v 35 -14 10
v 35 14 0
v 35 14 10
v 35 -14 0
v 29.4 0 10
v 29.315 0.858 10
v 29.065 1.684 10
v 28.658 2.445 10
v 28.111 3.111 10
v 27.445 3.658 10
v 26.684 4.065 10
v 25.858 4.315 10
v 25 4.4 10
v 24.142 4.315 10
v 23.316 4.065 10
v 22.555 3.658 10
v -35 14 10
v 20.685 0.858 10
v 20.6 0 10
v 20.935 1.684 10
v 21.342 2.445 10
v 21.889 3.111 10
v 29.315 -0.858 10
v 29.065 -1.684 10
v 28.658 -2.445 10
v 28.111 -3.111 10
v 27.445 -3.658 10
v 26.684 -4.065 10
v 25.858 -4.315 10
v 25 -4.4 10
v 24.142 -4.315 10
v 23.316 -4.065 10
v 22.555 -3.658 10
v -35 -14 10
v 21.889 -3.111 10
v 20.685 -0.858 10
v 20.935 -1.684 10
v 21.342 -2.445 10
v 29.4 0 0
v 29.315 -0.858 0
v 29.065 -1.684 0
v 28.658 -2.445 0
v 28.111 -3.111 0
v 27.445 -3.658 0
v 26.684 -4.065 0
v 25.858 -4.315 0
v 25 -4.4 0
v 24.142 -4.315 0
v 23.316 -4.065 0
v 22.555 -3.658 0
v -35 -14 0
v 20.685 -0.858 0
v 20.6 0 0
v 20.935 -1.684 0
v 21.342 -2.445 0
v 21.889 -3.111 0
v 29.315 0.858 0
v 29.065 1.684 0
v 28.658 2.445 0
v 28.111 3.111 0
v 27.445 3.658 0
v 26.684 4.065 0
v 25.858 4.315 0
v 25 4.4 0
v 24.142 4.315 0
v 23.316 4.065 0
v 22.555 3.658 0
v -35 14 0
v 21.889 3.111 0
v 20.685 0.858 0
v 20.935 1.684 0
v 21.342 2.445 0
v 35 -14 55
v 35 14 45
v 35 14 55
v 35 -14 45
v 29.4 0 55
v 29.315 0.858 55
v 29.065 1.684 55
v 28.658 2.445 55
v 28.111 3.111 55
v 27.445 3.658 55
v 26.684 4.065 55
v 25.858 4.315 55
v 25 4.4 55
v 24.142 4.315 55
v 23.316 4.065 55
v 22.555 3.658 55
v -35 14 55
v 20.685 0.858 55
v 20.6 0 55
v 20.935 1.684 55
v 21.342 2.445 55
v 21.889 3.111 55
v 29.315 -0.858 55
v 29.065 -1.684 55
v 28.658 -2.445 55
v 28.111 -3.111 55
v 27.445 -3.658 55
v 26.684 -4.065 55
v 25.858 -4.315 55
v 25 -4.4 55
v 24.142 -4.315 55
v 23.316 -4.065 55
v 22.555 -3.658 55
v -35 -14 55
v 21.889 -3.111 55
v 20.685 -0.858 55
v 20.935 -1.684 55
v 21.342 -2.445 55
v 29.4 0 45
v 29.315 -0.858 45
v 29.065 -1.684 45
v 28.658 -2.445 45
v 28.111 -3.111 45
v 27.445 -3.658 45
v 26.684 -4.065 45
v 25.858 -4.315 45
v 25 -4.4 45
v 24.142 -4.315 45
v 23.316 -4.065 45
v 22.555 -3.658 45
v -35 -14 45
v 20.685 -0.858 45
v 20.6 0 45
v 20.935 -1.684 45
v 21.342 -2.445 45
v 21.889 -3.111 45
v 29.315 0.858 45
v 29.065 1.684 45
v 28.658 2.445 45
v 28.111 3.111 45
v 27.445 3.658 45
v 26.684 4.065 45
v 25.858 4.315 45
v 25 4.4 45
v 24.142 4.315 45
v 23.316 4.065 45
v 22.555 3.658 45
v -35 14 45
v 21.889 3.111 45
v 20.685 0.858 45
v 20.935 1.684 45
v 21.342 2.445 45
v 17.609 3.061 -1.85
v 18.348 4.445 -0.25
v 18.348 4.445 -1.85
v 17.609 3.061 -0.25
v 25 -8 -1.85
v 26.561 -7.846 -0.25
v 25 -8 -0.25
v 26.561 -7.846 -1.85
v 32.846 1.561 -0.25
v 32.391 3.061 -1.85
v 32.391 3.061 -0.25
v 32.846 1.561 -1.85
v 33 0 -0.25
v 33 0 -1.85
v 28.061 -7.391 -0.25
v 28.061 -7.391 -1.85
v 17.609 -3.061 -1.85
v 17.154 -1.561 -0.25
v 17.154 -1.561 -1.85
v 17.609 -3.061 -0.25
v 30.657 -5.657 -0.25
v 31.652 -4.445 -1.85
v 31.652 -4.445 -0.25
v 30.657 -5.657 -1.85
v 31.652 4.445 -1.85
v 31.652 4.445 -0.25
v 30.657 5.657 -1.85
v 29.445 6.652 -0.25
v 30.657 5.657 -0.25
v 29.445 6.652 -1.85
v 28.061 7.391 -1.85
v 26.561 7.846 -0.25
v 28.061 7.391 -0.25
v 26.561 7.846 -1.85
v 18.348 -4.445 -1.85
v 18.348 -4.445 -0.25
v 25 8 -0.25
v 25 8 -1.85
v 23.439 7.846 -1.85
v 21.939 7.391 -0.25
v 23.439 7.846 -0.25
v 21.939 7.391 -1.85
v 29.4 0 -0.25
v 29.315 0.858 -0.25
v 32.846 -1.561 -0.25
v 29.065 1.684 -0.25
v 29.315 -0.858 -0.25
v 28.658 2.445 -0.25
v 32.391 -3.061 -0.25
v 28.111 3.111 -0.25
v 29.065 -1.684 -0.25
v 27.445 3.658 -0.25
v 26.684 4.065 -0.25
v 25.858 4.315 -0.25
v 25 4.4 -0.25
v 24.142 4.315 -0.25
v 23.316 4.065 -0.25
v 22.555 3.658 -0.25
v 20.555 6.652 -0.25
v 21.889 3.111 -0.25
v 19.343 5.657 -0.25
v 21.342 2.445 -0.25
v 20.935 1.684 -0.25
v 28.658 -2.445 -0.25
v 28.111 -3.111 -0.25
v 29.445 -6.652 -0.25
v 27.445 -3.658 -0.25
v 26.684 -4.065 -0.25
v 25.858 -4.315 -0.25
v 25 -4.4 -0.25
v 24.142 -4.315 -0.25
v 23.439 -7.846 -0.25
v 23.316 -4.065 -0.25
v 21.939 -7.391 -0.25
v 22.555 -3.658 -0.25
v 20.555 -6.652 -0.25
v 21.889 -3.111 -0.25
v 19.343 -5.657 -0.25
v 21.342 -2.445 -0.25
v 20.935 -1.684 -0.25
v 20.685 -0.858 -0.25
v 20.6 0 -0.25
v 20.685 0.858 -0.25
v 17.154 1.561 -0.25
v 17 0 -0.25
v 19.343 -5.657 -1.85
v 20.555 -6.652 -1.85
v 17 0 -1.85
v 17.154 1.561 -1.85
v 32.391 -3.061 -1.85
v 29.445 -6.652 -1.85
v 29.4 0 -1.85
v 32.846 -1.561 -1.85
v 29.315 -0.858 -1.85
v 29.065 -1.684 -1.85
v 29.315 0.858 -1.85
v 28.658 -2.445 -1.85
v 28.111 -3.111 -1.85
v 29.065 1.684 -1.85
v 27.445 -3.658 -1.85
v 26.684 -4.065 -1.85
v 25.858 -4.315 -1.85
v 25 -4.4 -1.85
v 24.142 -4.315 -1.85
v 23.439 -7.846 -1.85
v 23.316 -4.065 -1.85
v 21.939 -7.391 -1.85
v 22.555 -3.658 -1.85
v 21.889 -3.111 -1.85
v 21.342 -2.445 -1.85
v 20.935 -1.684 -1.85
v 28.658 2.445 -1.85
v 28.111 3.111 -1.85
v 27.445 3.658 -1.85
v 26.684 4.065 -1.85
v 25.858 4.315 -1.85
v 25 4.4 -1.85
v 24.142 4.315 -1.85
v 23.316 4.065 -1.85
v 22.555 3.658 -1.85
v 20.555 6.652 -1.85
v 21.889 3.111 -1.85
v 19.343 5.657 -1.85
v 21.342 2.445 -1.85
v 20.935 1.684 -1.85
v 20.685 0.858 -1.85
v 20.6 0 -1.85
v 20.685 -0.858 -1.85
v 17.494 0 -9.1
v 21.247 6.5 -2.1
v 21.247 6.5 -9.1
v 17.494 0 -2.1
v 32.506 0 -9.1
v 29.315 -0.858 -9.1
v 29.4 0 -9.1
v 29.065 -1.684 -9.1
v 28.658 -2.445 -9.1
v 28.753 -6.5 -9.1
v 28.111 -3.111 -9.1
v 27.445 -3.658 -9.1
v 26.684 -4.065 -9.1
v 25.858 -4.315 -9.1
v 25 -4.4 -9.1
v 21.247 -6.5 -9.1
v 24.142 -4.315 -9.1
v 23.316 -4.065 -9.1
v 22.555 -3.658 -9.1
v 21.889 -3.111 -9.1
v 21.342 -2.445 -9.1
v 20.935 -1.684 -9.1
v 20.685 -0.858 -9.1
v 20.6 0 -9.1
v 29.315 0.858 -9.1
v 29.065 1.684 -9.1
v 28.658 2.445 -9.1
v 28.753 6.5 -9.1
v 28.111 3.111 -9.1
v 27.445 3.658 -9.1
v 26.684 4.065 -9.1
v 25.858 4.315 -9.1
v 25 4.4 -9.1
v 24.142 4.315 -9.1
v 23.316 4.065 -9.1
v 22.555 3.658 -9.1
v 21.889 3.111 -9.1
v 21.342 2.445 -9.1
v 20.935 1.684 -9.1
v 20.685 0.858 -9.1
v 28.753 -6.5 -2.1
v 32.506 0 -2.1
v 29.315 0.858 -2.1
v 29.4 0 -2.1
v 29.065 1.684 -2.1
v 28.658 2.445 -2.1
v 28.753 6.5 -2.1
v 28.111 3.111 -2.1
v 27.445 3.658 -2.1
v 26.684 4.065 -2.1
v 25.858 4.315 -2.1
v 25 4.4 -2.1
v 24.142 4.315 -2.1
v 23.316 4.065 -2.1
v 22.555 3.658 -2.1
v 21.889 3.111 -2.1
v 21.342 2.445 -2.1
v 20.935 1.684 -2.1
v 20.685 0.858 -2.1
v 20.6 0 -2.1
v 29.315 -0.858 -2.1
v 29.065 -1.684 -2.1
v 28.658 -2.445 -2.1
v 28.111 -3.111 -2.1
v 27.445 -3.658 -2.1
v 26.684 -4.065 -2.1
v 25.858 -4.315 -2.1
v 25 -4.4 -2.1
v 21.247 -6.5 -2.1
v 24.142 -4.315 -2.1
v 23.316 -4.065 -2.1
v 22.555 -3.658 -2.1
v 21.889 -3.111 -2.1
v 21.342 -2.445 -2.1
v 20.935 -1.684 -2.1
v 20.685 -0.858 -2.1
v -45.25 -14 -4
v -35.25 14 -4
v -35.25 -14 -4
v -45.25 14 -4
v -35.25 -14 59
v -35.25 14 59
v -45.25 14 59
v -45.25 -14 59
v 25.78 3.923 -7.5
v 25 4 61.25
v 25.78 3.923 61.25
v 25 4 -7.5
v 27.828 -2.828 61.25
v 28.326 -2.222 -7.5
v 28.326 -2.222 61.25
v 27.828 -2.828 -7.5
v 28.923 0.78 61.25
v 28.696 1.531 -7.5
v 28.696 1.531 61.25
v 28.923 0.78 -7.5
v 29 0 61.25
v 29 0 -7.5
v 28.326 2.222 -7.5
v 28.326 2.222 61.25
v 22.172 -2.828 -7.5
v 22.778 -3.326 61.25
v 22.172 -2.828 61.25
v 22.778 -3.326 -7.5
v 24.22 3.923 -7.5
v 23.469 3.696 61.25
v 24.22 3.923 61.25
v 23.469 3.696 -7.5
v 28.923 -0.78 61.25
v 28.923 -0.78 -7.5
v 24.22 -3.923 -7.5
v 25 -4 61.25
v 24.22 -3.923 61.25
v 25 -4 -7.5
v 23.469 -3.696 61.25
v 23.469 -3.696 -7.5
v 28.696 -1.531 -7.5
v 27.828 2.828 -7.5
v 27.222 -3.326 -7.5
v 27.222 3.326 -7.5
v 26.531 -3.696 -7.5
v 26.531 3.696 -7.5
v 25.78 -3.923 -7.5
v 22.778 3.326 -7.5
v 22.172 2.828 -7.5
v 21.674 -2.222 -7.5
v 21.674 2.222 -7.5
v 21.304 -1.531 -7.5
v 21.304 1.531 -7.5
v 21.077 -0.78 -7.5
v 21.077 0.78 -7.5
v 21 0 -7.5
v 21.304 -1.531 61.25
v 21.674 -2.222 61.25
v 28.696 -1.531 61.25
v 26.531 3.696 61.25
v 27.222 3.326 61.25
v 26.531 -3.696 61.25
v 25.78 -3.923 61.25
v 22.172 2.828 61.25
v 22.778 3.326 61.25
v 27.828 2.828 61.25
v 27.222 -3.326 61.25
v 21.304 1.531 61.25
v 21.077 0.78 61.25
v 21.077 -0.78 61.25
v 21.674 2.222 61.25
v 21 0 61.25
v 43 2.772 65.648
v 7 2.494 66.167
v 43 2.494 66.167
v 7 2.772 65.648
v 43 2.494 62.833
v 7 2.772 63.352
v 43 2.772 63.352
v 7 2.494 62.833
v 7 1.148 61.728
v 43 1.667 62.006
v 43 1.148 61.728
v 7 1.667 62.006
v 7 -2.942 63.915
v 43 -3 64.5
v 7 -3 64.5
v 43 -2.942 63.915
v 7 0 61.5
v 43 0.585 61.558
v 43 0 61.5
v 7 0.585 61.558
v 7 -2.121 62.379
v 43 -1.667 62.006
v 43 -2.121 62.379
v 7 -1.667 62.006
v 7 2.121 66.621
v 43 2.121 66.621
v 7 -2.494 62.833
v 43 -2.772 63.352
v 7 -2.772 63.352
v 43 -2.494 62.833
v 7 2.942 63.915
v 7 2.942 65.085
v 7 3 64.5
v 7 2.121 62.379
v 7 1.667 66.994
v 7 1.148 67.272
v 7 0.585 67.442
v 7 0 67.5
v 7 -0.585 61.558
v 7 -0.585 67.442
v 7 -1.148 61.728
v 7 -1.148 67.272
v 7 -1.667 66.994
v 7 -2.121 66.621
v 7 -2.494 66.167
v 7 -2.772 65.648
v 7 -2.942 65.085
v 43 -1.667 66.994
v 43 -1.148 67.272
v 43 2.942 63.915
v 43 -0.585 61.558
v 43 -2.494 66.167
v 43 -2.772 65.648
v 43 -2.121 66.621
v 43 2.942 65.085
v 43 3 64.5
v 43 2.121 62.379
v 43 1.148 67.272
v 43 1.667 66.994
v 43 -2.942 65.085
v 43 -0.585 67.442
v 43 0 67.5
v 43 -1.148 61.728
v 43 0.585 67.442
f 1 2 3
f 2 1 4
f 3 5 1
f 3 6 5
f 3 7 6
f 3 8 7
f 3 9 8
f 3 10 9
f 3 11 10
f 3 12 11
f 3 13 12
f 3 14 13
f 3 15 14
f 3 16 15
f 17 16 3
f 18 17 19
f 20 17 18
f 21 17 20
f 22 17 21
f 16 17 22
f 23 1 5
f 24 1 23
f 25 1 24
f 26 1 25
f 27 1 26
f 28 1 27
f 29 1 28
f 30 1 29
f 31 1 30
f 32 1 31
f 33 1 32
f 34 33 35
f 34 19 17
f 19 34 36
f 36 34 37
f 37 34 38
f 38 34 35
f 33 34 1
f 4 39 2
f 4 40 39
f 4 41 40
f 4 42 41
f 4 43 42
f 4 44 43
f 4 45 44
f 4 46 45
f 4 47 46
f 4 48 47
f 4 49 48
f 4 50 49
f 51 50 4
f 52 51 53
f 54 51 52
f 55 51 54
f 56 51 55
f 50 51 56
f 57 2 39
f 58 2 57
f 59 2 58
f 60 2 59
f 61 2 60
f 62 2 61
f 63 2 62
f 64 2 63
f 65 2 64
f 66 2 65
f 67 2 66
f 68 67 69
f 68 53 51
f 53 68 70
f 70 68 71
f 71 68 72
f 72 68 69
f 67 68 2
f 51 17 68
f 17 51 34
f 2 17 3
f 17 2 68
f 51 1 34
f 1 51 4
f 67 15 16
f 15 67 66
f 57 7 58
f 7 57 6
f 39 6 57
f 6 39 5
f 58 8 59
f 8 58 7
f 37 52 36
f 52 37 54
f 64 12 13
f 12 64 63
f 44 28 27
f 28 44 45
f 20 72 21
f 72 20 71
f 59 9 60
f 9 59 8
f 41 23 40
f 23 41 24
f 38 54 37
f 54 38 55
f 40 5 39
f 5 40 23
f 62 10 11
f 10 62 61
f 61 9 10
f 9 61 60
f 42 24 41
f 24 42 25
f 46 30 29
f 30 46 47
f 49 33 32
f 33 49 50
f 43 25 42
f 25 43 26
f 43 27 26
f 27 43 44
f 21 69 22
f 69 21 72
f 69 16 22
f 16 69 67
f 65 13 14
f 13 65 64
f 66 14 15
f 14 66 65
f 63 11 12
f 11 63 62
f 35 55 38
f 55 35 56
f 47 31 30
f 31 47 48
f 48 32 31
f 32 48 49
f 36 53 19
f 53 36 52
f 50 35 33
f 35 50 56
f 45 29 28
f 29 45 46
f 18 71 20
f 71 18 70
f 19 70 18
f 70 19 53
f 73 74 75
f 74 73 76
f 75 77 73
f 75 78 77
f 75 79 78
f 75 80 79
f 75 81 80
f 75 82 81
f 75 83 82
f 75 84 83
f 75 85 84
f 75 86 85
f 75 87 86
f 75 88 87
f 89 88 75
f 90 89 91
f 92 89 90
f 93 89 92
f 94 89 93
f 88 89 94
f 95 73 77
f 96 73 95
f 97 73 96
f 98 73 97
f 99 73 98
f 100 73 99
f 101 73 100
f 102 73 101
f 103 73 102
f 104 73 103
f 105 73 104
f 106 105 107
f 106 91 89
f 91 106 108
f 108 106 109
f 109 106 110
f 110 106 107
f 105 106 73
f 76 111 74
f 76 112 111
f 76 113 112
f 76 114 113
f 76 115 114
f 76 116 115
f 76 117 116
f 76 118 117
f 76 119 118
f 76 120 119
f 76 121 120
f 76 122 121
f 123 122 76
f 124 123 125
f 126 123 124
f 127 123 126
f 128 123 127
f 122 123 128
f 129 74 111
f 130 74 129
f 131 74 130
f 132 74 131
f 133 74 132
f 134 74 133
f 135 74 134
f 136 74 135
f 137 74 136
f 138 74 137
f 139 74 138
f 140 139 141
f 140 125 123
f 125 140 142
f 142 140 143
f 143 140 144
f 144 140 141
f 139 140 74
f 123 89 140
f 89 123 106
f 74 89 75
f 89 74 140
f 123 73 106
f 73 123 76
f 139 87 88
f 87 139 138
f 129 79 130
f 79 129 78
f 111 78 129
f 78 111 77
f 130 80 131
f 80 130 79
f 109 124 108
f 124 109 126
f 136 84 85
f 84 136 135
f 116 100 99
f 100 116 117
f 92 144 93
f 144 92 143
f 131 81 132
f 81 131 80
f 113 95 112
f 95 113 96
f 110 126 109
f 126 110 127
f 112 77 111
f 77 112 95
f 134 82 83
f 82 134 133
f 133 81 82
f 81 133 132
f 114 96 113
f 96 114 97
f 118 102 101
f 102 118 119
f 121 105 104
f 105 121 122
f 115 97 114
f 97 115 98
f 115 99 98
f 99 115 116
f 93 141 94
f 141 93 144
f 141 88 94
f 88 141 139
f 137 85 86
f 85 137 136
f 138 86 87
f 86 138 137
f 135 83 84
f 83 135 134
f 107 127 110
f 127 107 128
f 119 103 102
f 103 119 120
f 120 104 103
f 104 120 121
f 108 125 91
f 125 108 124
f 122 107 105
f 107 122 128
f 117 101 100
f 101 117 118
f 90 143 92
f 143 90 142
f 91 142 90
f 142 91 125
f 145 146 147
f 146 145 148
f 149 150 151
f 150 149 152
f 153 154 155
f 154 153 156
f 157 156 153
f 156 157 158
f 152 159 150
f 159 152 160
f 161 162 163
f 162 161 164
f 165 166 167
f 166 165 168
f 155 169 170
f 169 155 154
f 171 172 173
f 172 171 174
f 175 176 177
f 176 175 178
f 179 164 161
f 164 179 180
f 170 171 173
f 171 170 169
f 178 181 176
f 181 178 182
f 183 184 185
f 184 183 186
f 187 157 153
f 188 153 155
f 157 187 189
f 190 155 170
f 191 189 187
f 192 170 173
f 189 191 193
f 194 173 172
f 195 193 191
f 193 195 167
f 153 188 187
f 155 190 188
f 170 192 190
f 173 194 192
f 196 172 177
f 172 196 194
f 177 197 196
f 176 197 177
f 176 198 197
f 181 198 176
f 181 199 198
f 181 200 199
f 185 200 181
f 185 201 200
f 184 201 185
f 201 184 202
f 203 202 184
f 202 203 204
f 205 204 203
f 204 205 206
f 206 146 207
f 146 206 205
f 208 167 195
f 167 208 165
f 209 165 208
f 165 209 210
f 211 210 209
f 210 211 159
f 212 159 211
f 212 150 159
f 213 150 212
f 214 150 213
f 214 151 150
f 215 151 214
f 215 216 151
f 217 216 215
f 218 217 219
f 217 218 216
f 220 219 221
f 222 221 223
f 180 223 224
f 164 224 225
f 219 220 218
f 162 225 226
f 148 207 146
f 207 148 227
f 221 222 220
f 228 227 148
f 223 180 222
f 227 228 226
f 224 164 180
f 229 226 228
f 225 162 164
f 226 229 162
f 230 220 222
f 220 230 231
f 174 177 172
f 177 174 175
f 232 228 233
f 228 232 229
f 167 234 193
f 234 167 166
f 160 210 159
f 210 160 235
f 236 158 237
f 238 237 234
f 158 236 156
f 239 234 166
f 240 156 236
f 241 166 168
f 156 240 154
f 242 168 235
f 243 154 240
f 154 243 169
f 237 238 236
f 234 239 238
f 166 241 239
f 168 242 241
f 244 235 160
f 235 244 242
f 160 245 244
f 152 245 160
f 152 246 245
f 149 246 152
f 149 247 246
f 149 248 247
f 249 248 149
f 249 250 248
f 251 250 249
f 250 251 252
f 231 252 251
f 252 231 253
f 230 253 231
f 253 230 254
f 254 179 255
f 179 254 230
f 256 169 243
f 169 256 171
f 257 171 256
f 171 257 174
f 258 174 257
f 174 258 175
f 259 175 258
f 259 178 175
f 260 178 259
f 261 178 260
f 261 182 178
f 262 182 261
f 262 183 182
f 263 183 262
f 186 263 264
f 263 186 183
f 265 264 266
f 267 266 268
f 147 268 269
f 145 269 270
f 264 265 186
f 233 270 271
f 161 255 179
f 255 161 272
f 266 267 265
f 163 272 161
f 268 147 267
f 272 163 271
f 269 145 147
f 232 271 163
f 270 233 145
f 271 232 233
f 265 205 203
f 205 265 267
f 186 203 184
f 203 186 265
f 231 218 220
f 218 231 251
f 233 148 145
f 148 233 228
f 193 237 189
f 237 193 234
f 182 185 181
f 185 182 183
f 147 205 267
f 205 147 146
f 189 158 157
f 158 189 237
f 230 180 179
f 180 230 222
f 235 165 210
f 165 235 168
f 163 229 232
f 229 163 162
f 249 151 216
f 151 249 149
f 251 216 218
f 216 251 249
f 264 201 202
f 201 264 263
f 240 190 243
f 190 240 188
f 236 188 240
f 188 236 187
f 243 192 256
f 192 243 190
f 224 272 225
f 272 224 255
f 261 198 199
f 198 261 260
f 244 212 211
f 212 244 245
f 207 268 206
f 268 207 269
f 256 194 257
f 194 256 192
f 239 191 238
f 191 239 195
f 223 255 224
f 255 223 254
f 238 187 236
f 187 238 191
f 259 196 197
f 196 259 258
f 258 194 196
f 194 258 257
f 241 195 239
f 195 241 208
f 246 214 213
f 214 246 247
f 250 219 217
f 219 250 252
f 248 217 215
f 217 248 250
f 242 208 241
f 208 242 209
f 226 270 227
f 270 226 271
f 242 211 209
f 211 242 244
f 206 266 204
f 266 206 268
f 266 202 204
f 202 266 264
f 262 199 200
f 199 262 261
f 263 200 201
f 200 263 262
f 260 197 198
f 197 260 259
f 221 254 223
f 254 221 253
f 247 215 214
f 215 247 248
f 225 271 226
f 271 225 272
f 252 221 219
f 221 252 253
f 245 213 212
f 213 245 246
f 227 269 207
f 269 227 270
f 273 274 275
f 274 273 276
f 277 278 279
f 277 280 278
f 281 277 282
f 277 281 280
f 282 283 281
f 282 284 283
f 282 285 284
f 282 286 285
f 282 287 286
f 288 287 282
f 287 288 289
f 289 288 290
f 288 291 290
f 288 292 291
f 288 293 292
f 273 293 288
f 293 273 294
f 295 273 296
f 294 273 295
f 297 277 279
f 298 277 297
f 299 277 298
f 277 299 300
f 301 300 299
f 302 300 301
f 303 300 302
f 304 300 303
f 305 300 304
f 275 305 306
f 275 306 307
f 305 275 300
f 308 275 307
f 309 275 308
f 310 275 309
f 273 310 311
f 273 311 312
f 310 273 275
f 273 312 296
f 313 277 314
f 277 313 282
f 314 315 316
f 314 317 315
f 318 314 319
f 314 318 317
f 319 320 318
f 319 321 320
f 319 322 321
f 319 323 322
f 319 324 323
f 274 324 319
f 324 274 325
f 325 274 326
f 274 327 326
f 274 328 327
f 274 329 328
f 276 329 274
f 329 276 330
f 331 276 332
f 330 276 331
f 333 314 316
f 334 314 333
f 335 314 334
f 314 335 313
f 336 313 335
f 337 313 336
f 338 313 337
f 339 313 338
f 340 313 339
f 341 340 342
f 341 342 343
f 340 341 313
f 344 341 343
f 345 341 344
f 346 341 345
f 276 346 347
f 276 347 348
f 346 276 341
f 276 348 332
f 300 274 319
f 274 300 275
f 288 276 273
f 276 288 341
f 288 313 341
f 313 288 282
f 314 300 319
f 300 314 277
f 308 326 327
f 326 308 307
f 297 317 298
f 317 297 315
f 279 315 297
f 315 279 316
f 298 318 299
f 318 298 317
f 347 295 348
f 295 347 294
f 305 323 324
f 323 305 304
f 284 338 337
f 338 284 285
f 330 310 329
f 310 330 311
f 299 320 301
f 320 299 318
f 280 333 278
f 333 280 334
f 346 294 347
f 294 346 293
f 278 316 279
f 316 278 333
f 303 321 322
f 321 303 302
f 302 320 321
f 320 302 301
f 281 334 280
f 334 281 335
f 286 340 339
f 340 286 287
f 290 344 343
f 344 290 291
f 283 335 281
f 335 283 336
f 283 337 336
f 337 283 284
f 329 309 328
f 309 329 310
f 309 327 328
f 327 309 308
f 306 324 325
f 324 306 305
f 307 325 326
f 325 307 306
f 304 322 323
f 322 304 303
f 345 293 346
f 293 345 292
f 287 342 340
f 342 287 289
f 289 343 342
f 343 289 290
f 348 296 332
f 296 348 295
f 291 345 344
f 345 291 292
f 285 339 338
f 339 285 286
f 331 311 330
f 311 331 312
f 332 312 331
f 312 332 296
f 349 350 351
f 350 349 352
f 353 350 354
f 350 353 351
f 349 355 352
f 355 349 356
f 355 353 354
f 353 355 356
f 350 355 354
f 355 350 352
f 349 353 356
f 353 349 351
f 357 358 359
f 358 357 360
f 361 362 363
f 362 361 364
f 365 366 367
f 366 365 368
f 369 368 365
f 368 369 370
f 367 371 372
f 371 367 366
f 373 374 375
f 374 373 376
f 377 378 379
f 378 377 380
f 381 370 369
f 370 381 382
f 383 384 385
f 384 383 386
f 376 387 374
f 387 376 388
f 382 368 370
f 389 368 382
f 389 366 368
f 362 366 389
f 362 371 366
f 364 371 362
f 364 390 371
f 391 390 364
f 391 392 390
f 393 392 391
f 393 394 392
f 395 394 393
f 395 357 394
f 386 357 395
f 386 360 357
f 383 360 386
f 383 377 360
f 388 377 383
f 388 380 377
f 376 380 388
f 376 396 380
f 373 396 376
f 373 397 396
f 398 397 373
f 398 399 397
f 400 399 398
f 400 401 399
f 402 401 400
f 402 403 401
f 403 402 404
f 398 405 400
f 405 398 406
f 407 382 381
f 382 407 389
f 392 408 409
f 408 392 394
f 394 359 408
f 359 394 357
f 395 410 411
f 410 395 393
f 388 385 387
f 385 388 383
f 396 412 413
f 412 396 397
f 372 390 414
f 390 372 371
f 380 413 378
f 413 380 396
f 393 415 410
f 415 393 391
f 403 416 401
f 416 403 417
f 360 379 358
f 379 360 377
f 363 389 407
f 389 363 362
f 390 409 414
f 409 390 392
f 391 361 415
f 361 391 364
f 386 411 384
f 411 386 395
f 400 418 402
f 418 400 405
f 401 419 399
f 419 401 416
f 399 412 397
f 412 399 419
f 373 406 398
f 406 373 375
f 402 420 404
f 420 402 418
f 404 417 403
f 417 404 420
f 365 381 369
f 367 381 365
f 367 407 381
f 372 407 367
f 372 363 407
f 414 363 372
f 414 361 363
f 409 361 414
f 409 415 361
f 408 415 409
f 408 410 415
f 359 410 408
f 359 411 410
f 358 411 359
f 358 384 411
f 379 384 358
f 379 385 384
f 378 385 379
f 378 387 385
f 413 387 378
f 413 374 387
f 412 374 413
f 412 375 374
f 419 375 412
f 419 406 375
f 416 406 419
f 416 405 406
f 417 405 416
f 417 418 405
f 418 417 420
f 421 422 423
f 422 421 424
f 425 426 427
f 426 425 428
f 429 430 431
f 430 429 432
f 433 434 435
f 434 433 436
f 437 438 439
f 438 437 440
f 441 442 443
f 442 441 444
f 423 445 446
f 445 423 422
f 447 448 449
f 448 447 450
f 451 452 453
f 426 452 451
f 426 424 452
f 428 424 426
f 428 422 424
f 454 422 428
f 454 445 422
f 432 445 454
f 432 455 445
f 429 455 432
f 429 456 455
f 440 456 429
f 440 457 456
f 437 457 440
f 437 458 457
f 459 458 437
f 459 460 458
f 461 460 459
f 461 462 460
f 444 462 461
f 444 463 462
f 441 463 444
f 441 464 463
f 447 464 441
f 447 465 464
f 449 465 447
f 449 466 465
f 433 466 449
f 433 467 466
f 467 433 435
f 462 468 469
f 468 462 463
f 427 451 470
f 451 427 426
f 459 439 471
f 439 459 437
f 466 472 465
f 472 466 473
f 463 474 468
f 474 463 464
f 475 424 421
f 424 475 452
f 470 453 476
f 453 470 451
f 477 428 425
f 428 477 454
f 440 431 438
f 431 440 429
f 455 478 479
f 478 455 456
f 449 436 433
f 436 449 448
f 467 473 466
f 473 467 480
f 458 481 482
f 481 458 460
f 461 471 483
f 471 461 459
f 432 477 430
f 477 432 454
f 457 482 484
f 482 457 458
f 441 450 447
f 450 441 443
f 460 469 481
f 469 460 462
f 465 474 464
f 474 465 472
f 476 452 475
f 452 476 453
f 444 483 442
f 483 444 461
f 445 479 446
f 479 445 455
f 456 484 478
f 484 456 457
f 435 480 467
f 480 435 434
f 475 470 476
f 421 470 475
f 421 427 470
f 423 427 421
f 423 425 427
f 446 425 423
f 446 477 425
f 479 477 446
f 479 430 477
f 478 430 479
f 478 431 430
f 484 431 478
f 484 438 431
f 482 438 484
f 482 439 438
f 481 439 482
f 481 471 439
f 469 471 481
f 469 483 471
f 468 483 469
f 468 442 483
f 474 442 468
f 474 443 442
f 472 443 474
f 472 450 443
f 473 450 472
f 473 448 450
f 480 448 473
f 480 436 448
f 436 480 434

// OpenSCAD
$fn = 32;

// ------------------------------------------------------------------------
// C clamp: throat 45 mm, screw d8
// Every part is its own module, assembly() places every instance.
// ------------------------------------------------------------------------

// --- part 1 ---
module clamp_arm() {
  difference() {
    translate([-35, -14, 0]) cube([70, 28, 10]);
    translate([25, 0, -1]) cylinder(h = 12, d = 8.8);
  }
}

// --- part 2 ---
module clamp_spine() {
  difference() {
    translate([-31.5, -14, 0]) cube([63, 28, 10]);
  }
}

// --- part 3 ---
module clamp_screw() {
  translate([0, 0, -34.375]) cylinder(h = 68.75, d = 8);
}

// --- part 4 ---
module clamp_washer() {
  difference() {
      translate([0, 0, 0]) cylinder(h = 1.6, d = 16);
      translate([0, 0, -1]) cylinder(h = 3.6, d = 8.8);
    }
}

// --- part 5 ---
module clamp_nut() {
  difference() {
    linear_extrude(height = 7) polygon(points = [[7.506, 0], [3.753, 6.5], [-3.753, 6.5], [-7.506, 0], [-3.753, -6.5], [3.753, -6.5]]);
    translate([0, 0, -1]) cylinder(h = 9, d = 8.8);
  }
}

// --- part 6 ---
module tommy_bar() {
  translate([0, 0, -18]) cylinder(h = 36, d = 6);
}

// --- assembly ---
module assembly() {
  color([0.80, 0.24, 0.20]) translate([0, 0, 0]) rotate([0, 0, 0]) clamp_arm();
  color([0.20, 0.45, 0.75]) translate([0, 0, 45]) rotate([0, 0, 0]) clamp_arm();
  color([0.25, 0.62, 0.32]) translate([-45.25, 0, 27.5]) rotate([0, 90, 0]) clamp_spine();
  color([0.92, 0.70, 0.18]) translate([25, 0, 26.875]) rotate([0, 0, 0]) clamp_screw();
  color([0.58, 0.35, 0.70]) translate([25, 0, -1.85]) rotate([0, 0, 0]) clamp_washer();
  color([0.16, 0.66, 0.66]) translate([25, 0, -9.1]) rotate([0, 0, 0]) clamp_nut();
  color([0.85, 0.48, 0.18]) translate([25, 0, 64.5]) rotate([0, 90, 0]) tommy_bar();
}

assembly();
